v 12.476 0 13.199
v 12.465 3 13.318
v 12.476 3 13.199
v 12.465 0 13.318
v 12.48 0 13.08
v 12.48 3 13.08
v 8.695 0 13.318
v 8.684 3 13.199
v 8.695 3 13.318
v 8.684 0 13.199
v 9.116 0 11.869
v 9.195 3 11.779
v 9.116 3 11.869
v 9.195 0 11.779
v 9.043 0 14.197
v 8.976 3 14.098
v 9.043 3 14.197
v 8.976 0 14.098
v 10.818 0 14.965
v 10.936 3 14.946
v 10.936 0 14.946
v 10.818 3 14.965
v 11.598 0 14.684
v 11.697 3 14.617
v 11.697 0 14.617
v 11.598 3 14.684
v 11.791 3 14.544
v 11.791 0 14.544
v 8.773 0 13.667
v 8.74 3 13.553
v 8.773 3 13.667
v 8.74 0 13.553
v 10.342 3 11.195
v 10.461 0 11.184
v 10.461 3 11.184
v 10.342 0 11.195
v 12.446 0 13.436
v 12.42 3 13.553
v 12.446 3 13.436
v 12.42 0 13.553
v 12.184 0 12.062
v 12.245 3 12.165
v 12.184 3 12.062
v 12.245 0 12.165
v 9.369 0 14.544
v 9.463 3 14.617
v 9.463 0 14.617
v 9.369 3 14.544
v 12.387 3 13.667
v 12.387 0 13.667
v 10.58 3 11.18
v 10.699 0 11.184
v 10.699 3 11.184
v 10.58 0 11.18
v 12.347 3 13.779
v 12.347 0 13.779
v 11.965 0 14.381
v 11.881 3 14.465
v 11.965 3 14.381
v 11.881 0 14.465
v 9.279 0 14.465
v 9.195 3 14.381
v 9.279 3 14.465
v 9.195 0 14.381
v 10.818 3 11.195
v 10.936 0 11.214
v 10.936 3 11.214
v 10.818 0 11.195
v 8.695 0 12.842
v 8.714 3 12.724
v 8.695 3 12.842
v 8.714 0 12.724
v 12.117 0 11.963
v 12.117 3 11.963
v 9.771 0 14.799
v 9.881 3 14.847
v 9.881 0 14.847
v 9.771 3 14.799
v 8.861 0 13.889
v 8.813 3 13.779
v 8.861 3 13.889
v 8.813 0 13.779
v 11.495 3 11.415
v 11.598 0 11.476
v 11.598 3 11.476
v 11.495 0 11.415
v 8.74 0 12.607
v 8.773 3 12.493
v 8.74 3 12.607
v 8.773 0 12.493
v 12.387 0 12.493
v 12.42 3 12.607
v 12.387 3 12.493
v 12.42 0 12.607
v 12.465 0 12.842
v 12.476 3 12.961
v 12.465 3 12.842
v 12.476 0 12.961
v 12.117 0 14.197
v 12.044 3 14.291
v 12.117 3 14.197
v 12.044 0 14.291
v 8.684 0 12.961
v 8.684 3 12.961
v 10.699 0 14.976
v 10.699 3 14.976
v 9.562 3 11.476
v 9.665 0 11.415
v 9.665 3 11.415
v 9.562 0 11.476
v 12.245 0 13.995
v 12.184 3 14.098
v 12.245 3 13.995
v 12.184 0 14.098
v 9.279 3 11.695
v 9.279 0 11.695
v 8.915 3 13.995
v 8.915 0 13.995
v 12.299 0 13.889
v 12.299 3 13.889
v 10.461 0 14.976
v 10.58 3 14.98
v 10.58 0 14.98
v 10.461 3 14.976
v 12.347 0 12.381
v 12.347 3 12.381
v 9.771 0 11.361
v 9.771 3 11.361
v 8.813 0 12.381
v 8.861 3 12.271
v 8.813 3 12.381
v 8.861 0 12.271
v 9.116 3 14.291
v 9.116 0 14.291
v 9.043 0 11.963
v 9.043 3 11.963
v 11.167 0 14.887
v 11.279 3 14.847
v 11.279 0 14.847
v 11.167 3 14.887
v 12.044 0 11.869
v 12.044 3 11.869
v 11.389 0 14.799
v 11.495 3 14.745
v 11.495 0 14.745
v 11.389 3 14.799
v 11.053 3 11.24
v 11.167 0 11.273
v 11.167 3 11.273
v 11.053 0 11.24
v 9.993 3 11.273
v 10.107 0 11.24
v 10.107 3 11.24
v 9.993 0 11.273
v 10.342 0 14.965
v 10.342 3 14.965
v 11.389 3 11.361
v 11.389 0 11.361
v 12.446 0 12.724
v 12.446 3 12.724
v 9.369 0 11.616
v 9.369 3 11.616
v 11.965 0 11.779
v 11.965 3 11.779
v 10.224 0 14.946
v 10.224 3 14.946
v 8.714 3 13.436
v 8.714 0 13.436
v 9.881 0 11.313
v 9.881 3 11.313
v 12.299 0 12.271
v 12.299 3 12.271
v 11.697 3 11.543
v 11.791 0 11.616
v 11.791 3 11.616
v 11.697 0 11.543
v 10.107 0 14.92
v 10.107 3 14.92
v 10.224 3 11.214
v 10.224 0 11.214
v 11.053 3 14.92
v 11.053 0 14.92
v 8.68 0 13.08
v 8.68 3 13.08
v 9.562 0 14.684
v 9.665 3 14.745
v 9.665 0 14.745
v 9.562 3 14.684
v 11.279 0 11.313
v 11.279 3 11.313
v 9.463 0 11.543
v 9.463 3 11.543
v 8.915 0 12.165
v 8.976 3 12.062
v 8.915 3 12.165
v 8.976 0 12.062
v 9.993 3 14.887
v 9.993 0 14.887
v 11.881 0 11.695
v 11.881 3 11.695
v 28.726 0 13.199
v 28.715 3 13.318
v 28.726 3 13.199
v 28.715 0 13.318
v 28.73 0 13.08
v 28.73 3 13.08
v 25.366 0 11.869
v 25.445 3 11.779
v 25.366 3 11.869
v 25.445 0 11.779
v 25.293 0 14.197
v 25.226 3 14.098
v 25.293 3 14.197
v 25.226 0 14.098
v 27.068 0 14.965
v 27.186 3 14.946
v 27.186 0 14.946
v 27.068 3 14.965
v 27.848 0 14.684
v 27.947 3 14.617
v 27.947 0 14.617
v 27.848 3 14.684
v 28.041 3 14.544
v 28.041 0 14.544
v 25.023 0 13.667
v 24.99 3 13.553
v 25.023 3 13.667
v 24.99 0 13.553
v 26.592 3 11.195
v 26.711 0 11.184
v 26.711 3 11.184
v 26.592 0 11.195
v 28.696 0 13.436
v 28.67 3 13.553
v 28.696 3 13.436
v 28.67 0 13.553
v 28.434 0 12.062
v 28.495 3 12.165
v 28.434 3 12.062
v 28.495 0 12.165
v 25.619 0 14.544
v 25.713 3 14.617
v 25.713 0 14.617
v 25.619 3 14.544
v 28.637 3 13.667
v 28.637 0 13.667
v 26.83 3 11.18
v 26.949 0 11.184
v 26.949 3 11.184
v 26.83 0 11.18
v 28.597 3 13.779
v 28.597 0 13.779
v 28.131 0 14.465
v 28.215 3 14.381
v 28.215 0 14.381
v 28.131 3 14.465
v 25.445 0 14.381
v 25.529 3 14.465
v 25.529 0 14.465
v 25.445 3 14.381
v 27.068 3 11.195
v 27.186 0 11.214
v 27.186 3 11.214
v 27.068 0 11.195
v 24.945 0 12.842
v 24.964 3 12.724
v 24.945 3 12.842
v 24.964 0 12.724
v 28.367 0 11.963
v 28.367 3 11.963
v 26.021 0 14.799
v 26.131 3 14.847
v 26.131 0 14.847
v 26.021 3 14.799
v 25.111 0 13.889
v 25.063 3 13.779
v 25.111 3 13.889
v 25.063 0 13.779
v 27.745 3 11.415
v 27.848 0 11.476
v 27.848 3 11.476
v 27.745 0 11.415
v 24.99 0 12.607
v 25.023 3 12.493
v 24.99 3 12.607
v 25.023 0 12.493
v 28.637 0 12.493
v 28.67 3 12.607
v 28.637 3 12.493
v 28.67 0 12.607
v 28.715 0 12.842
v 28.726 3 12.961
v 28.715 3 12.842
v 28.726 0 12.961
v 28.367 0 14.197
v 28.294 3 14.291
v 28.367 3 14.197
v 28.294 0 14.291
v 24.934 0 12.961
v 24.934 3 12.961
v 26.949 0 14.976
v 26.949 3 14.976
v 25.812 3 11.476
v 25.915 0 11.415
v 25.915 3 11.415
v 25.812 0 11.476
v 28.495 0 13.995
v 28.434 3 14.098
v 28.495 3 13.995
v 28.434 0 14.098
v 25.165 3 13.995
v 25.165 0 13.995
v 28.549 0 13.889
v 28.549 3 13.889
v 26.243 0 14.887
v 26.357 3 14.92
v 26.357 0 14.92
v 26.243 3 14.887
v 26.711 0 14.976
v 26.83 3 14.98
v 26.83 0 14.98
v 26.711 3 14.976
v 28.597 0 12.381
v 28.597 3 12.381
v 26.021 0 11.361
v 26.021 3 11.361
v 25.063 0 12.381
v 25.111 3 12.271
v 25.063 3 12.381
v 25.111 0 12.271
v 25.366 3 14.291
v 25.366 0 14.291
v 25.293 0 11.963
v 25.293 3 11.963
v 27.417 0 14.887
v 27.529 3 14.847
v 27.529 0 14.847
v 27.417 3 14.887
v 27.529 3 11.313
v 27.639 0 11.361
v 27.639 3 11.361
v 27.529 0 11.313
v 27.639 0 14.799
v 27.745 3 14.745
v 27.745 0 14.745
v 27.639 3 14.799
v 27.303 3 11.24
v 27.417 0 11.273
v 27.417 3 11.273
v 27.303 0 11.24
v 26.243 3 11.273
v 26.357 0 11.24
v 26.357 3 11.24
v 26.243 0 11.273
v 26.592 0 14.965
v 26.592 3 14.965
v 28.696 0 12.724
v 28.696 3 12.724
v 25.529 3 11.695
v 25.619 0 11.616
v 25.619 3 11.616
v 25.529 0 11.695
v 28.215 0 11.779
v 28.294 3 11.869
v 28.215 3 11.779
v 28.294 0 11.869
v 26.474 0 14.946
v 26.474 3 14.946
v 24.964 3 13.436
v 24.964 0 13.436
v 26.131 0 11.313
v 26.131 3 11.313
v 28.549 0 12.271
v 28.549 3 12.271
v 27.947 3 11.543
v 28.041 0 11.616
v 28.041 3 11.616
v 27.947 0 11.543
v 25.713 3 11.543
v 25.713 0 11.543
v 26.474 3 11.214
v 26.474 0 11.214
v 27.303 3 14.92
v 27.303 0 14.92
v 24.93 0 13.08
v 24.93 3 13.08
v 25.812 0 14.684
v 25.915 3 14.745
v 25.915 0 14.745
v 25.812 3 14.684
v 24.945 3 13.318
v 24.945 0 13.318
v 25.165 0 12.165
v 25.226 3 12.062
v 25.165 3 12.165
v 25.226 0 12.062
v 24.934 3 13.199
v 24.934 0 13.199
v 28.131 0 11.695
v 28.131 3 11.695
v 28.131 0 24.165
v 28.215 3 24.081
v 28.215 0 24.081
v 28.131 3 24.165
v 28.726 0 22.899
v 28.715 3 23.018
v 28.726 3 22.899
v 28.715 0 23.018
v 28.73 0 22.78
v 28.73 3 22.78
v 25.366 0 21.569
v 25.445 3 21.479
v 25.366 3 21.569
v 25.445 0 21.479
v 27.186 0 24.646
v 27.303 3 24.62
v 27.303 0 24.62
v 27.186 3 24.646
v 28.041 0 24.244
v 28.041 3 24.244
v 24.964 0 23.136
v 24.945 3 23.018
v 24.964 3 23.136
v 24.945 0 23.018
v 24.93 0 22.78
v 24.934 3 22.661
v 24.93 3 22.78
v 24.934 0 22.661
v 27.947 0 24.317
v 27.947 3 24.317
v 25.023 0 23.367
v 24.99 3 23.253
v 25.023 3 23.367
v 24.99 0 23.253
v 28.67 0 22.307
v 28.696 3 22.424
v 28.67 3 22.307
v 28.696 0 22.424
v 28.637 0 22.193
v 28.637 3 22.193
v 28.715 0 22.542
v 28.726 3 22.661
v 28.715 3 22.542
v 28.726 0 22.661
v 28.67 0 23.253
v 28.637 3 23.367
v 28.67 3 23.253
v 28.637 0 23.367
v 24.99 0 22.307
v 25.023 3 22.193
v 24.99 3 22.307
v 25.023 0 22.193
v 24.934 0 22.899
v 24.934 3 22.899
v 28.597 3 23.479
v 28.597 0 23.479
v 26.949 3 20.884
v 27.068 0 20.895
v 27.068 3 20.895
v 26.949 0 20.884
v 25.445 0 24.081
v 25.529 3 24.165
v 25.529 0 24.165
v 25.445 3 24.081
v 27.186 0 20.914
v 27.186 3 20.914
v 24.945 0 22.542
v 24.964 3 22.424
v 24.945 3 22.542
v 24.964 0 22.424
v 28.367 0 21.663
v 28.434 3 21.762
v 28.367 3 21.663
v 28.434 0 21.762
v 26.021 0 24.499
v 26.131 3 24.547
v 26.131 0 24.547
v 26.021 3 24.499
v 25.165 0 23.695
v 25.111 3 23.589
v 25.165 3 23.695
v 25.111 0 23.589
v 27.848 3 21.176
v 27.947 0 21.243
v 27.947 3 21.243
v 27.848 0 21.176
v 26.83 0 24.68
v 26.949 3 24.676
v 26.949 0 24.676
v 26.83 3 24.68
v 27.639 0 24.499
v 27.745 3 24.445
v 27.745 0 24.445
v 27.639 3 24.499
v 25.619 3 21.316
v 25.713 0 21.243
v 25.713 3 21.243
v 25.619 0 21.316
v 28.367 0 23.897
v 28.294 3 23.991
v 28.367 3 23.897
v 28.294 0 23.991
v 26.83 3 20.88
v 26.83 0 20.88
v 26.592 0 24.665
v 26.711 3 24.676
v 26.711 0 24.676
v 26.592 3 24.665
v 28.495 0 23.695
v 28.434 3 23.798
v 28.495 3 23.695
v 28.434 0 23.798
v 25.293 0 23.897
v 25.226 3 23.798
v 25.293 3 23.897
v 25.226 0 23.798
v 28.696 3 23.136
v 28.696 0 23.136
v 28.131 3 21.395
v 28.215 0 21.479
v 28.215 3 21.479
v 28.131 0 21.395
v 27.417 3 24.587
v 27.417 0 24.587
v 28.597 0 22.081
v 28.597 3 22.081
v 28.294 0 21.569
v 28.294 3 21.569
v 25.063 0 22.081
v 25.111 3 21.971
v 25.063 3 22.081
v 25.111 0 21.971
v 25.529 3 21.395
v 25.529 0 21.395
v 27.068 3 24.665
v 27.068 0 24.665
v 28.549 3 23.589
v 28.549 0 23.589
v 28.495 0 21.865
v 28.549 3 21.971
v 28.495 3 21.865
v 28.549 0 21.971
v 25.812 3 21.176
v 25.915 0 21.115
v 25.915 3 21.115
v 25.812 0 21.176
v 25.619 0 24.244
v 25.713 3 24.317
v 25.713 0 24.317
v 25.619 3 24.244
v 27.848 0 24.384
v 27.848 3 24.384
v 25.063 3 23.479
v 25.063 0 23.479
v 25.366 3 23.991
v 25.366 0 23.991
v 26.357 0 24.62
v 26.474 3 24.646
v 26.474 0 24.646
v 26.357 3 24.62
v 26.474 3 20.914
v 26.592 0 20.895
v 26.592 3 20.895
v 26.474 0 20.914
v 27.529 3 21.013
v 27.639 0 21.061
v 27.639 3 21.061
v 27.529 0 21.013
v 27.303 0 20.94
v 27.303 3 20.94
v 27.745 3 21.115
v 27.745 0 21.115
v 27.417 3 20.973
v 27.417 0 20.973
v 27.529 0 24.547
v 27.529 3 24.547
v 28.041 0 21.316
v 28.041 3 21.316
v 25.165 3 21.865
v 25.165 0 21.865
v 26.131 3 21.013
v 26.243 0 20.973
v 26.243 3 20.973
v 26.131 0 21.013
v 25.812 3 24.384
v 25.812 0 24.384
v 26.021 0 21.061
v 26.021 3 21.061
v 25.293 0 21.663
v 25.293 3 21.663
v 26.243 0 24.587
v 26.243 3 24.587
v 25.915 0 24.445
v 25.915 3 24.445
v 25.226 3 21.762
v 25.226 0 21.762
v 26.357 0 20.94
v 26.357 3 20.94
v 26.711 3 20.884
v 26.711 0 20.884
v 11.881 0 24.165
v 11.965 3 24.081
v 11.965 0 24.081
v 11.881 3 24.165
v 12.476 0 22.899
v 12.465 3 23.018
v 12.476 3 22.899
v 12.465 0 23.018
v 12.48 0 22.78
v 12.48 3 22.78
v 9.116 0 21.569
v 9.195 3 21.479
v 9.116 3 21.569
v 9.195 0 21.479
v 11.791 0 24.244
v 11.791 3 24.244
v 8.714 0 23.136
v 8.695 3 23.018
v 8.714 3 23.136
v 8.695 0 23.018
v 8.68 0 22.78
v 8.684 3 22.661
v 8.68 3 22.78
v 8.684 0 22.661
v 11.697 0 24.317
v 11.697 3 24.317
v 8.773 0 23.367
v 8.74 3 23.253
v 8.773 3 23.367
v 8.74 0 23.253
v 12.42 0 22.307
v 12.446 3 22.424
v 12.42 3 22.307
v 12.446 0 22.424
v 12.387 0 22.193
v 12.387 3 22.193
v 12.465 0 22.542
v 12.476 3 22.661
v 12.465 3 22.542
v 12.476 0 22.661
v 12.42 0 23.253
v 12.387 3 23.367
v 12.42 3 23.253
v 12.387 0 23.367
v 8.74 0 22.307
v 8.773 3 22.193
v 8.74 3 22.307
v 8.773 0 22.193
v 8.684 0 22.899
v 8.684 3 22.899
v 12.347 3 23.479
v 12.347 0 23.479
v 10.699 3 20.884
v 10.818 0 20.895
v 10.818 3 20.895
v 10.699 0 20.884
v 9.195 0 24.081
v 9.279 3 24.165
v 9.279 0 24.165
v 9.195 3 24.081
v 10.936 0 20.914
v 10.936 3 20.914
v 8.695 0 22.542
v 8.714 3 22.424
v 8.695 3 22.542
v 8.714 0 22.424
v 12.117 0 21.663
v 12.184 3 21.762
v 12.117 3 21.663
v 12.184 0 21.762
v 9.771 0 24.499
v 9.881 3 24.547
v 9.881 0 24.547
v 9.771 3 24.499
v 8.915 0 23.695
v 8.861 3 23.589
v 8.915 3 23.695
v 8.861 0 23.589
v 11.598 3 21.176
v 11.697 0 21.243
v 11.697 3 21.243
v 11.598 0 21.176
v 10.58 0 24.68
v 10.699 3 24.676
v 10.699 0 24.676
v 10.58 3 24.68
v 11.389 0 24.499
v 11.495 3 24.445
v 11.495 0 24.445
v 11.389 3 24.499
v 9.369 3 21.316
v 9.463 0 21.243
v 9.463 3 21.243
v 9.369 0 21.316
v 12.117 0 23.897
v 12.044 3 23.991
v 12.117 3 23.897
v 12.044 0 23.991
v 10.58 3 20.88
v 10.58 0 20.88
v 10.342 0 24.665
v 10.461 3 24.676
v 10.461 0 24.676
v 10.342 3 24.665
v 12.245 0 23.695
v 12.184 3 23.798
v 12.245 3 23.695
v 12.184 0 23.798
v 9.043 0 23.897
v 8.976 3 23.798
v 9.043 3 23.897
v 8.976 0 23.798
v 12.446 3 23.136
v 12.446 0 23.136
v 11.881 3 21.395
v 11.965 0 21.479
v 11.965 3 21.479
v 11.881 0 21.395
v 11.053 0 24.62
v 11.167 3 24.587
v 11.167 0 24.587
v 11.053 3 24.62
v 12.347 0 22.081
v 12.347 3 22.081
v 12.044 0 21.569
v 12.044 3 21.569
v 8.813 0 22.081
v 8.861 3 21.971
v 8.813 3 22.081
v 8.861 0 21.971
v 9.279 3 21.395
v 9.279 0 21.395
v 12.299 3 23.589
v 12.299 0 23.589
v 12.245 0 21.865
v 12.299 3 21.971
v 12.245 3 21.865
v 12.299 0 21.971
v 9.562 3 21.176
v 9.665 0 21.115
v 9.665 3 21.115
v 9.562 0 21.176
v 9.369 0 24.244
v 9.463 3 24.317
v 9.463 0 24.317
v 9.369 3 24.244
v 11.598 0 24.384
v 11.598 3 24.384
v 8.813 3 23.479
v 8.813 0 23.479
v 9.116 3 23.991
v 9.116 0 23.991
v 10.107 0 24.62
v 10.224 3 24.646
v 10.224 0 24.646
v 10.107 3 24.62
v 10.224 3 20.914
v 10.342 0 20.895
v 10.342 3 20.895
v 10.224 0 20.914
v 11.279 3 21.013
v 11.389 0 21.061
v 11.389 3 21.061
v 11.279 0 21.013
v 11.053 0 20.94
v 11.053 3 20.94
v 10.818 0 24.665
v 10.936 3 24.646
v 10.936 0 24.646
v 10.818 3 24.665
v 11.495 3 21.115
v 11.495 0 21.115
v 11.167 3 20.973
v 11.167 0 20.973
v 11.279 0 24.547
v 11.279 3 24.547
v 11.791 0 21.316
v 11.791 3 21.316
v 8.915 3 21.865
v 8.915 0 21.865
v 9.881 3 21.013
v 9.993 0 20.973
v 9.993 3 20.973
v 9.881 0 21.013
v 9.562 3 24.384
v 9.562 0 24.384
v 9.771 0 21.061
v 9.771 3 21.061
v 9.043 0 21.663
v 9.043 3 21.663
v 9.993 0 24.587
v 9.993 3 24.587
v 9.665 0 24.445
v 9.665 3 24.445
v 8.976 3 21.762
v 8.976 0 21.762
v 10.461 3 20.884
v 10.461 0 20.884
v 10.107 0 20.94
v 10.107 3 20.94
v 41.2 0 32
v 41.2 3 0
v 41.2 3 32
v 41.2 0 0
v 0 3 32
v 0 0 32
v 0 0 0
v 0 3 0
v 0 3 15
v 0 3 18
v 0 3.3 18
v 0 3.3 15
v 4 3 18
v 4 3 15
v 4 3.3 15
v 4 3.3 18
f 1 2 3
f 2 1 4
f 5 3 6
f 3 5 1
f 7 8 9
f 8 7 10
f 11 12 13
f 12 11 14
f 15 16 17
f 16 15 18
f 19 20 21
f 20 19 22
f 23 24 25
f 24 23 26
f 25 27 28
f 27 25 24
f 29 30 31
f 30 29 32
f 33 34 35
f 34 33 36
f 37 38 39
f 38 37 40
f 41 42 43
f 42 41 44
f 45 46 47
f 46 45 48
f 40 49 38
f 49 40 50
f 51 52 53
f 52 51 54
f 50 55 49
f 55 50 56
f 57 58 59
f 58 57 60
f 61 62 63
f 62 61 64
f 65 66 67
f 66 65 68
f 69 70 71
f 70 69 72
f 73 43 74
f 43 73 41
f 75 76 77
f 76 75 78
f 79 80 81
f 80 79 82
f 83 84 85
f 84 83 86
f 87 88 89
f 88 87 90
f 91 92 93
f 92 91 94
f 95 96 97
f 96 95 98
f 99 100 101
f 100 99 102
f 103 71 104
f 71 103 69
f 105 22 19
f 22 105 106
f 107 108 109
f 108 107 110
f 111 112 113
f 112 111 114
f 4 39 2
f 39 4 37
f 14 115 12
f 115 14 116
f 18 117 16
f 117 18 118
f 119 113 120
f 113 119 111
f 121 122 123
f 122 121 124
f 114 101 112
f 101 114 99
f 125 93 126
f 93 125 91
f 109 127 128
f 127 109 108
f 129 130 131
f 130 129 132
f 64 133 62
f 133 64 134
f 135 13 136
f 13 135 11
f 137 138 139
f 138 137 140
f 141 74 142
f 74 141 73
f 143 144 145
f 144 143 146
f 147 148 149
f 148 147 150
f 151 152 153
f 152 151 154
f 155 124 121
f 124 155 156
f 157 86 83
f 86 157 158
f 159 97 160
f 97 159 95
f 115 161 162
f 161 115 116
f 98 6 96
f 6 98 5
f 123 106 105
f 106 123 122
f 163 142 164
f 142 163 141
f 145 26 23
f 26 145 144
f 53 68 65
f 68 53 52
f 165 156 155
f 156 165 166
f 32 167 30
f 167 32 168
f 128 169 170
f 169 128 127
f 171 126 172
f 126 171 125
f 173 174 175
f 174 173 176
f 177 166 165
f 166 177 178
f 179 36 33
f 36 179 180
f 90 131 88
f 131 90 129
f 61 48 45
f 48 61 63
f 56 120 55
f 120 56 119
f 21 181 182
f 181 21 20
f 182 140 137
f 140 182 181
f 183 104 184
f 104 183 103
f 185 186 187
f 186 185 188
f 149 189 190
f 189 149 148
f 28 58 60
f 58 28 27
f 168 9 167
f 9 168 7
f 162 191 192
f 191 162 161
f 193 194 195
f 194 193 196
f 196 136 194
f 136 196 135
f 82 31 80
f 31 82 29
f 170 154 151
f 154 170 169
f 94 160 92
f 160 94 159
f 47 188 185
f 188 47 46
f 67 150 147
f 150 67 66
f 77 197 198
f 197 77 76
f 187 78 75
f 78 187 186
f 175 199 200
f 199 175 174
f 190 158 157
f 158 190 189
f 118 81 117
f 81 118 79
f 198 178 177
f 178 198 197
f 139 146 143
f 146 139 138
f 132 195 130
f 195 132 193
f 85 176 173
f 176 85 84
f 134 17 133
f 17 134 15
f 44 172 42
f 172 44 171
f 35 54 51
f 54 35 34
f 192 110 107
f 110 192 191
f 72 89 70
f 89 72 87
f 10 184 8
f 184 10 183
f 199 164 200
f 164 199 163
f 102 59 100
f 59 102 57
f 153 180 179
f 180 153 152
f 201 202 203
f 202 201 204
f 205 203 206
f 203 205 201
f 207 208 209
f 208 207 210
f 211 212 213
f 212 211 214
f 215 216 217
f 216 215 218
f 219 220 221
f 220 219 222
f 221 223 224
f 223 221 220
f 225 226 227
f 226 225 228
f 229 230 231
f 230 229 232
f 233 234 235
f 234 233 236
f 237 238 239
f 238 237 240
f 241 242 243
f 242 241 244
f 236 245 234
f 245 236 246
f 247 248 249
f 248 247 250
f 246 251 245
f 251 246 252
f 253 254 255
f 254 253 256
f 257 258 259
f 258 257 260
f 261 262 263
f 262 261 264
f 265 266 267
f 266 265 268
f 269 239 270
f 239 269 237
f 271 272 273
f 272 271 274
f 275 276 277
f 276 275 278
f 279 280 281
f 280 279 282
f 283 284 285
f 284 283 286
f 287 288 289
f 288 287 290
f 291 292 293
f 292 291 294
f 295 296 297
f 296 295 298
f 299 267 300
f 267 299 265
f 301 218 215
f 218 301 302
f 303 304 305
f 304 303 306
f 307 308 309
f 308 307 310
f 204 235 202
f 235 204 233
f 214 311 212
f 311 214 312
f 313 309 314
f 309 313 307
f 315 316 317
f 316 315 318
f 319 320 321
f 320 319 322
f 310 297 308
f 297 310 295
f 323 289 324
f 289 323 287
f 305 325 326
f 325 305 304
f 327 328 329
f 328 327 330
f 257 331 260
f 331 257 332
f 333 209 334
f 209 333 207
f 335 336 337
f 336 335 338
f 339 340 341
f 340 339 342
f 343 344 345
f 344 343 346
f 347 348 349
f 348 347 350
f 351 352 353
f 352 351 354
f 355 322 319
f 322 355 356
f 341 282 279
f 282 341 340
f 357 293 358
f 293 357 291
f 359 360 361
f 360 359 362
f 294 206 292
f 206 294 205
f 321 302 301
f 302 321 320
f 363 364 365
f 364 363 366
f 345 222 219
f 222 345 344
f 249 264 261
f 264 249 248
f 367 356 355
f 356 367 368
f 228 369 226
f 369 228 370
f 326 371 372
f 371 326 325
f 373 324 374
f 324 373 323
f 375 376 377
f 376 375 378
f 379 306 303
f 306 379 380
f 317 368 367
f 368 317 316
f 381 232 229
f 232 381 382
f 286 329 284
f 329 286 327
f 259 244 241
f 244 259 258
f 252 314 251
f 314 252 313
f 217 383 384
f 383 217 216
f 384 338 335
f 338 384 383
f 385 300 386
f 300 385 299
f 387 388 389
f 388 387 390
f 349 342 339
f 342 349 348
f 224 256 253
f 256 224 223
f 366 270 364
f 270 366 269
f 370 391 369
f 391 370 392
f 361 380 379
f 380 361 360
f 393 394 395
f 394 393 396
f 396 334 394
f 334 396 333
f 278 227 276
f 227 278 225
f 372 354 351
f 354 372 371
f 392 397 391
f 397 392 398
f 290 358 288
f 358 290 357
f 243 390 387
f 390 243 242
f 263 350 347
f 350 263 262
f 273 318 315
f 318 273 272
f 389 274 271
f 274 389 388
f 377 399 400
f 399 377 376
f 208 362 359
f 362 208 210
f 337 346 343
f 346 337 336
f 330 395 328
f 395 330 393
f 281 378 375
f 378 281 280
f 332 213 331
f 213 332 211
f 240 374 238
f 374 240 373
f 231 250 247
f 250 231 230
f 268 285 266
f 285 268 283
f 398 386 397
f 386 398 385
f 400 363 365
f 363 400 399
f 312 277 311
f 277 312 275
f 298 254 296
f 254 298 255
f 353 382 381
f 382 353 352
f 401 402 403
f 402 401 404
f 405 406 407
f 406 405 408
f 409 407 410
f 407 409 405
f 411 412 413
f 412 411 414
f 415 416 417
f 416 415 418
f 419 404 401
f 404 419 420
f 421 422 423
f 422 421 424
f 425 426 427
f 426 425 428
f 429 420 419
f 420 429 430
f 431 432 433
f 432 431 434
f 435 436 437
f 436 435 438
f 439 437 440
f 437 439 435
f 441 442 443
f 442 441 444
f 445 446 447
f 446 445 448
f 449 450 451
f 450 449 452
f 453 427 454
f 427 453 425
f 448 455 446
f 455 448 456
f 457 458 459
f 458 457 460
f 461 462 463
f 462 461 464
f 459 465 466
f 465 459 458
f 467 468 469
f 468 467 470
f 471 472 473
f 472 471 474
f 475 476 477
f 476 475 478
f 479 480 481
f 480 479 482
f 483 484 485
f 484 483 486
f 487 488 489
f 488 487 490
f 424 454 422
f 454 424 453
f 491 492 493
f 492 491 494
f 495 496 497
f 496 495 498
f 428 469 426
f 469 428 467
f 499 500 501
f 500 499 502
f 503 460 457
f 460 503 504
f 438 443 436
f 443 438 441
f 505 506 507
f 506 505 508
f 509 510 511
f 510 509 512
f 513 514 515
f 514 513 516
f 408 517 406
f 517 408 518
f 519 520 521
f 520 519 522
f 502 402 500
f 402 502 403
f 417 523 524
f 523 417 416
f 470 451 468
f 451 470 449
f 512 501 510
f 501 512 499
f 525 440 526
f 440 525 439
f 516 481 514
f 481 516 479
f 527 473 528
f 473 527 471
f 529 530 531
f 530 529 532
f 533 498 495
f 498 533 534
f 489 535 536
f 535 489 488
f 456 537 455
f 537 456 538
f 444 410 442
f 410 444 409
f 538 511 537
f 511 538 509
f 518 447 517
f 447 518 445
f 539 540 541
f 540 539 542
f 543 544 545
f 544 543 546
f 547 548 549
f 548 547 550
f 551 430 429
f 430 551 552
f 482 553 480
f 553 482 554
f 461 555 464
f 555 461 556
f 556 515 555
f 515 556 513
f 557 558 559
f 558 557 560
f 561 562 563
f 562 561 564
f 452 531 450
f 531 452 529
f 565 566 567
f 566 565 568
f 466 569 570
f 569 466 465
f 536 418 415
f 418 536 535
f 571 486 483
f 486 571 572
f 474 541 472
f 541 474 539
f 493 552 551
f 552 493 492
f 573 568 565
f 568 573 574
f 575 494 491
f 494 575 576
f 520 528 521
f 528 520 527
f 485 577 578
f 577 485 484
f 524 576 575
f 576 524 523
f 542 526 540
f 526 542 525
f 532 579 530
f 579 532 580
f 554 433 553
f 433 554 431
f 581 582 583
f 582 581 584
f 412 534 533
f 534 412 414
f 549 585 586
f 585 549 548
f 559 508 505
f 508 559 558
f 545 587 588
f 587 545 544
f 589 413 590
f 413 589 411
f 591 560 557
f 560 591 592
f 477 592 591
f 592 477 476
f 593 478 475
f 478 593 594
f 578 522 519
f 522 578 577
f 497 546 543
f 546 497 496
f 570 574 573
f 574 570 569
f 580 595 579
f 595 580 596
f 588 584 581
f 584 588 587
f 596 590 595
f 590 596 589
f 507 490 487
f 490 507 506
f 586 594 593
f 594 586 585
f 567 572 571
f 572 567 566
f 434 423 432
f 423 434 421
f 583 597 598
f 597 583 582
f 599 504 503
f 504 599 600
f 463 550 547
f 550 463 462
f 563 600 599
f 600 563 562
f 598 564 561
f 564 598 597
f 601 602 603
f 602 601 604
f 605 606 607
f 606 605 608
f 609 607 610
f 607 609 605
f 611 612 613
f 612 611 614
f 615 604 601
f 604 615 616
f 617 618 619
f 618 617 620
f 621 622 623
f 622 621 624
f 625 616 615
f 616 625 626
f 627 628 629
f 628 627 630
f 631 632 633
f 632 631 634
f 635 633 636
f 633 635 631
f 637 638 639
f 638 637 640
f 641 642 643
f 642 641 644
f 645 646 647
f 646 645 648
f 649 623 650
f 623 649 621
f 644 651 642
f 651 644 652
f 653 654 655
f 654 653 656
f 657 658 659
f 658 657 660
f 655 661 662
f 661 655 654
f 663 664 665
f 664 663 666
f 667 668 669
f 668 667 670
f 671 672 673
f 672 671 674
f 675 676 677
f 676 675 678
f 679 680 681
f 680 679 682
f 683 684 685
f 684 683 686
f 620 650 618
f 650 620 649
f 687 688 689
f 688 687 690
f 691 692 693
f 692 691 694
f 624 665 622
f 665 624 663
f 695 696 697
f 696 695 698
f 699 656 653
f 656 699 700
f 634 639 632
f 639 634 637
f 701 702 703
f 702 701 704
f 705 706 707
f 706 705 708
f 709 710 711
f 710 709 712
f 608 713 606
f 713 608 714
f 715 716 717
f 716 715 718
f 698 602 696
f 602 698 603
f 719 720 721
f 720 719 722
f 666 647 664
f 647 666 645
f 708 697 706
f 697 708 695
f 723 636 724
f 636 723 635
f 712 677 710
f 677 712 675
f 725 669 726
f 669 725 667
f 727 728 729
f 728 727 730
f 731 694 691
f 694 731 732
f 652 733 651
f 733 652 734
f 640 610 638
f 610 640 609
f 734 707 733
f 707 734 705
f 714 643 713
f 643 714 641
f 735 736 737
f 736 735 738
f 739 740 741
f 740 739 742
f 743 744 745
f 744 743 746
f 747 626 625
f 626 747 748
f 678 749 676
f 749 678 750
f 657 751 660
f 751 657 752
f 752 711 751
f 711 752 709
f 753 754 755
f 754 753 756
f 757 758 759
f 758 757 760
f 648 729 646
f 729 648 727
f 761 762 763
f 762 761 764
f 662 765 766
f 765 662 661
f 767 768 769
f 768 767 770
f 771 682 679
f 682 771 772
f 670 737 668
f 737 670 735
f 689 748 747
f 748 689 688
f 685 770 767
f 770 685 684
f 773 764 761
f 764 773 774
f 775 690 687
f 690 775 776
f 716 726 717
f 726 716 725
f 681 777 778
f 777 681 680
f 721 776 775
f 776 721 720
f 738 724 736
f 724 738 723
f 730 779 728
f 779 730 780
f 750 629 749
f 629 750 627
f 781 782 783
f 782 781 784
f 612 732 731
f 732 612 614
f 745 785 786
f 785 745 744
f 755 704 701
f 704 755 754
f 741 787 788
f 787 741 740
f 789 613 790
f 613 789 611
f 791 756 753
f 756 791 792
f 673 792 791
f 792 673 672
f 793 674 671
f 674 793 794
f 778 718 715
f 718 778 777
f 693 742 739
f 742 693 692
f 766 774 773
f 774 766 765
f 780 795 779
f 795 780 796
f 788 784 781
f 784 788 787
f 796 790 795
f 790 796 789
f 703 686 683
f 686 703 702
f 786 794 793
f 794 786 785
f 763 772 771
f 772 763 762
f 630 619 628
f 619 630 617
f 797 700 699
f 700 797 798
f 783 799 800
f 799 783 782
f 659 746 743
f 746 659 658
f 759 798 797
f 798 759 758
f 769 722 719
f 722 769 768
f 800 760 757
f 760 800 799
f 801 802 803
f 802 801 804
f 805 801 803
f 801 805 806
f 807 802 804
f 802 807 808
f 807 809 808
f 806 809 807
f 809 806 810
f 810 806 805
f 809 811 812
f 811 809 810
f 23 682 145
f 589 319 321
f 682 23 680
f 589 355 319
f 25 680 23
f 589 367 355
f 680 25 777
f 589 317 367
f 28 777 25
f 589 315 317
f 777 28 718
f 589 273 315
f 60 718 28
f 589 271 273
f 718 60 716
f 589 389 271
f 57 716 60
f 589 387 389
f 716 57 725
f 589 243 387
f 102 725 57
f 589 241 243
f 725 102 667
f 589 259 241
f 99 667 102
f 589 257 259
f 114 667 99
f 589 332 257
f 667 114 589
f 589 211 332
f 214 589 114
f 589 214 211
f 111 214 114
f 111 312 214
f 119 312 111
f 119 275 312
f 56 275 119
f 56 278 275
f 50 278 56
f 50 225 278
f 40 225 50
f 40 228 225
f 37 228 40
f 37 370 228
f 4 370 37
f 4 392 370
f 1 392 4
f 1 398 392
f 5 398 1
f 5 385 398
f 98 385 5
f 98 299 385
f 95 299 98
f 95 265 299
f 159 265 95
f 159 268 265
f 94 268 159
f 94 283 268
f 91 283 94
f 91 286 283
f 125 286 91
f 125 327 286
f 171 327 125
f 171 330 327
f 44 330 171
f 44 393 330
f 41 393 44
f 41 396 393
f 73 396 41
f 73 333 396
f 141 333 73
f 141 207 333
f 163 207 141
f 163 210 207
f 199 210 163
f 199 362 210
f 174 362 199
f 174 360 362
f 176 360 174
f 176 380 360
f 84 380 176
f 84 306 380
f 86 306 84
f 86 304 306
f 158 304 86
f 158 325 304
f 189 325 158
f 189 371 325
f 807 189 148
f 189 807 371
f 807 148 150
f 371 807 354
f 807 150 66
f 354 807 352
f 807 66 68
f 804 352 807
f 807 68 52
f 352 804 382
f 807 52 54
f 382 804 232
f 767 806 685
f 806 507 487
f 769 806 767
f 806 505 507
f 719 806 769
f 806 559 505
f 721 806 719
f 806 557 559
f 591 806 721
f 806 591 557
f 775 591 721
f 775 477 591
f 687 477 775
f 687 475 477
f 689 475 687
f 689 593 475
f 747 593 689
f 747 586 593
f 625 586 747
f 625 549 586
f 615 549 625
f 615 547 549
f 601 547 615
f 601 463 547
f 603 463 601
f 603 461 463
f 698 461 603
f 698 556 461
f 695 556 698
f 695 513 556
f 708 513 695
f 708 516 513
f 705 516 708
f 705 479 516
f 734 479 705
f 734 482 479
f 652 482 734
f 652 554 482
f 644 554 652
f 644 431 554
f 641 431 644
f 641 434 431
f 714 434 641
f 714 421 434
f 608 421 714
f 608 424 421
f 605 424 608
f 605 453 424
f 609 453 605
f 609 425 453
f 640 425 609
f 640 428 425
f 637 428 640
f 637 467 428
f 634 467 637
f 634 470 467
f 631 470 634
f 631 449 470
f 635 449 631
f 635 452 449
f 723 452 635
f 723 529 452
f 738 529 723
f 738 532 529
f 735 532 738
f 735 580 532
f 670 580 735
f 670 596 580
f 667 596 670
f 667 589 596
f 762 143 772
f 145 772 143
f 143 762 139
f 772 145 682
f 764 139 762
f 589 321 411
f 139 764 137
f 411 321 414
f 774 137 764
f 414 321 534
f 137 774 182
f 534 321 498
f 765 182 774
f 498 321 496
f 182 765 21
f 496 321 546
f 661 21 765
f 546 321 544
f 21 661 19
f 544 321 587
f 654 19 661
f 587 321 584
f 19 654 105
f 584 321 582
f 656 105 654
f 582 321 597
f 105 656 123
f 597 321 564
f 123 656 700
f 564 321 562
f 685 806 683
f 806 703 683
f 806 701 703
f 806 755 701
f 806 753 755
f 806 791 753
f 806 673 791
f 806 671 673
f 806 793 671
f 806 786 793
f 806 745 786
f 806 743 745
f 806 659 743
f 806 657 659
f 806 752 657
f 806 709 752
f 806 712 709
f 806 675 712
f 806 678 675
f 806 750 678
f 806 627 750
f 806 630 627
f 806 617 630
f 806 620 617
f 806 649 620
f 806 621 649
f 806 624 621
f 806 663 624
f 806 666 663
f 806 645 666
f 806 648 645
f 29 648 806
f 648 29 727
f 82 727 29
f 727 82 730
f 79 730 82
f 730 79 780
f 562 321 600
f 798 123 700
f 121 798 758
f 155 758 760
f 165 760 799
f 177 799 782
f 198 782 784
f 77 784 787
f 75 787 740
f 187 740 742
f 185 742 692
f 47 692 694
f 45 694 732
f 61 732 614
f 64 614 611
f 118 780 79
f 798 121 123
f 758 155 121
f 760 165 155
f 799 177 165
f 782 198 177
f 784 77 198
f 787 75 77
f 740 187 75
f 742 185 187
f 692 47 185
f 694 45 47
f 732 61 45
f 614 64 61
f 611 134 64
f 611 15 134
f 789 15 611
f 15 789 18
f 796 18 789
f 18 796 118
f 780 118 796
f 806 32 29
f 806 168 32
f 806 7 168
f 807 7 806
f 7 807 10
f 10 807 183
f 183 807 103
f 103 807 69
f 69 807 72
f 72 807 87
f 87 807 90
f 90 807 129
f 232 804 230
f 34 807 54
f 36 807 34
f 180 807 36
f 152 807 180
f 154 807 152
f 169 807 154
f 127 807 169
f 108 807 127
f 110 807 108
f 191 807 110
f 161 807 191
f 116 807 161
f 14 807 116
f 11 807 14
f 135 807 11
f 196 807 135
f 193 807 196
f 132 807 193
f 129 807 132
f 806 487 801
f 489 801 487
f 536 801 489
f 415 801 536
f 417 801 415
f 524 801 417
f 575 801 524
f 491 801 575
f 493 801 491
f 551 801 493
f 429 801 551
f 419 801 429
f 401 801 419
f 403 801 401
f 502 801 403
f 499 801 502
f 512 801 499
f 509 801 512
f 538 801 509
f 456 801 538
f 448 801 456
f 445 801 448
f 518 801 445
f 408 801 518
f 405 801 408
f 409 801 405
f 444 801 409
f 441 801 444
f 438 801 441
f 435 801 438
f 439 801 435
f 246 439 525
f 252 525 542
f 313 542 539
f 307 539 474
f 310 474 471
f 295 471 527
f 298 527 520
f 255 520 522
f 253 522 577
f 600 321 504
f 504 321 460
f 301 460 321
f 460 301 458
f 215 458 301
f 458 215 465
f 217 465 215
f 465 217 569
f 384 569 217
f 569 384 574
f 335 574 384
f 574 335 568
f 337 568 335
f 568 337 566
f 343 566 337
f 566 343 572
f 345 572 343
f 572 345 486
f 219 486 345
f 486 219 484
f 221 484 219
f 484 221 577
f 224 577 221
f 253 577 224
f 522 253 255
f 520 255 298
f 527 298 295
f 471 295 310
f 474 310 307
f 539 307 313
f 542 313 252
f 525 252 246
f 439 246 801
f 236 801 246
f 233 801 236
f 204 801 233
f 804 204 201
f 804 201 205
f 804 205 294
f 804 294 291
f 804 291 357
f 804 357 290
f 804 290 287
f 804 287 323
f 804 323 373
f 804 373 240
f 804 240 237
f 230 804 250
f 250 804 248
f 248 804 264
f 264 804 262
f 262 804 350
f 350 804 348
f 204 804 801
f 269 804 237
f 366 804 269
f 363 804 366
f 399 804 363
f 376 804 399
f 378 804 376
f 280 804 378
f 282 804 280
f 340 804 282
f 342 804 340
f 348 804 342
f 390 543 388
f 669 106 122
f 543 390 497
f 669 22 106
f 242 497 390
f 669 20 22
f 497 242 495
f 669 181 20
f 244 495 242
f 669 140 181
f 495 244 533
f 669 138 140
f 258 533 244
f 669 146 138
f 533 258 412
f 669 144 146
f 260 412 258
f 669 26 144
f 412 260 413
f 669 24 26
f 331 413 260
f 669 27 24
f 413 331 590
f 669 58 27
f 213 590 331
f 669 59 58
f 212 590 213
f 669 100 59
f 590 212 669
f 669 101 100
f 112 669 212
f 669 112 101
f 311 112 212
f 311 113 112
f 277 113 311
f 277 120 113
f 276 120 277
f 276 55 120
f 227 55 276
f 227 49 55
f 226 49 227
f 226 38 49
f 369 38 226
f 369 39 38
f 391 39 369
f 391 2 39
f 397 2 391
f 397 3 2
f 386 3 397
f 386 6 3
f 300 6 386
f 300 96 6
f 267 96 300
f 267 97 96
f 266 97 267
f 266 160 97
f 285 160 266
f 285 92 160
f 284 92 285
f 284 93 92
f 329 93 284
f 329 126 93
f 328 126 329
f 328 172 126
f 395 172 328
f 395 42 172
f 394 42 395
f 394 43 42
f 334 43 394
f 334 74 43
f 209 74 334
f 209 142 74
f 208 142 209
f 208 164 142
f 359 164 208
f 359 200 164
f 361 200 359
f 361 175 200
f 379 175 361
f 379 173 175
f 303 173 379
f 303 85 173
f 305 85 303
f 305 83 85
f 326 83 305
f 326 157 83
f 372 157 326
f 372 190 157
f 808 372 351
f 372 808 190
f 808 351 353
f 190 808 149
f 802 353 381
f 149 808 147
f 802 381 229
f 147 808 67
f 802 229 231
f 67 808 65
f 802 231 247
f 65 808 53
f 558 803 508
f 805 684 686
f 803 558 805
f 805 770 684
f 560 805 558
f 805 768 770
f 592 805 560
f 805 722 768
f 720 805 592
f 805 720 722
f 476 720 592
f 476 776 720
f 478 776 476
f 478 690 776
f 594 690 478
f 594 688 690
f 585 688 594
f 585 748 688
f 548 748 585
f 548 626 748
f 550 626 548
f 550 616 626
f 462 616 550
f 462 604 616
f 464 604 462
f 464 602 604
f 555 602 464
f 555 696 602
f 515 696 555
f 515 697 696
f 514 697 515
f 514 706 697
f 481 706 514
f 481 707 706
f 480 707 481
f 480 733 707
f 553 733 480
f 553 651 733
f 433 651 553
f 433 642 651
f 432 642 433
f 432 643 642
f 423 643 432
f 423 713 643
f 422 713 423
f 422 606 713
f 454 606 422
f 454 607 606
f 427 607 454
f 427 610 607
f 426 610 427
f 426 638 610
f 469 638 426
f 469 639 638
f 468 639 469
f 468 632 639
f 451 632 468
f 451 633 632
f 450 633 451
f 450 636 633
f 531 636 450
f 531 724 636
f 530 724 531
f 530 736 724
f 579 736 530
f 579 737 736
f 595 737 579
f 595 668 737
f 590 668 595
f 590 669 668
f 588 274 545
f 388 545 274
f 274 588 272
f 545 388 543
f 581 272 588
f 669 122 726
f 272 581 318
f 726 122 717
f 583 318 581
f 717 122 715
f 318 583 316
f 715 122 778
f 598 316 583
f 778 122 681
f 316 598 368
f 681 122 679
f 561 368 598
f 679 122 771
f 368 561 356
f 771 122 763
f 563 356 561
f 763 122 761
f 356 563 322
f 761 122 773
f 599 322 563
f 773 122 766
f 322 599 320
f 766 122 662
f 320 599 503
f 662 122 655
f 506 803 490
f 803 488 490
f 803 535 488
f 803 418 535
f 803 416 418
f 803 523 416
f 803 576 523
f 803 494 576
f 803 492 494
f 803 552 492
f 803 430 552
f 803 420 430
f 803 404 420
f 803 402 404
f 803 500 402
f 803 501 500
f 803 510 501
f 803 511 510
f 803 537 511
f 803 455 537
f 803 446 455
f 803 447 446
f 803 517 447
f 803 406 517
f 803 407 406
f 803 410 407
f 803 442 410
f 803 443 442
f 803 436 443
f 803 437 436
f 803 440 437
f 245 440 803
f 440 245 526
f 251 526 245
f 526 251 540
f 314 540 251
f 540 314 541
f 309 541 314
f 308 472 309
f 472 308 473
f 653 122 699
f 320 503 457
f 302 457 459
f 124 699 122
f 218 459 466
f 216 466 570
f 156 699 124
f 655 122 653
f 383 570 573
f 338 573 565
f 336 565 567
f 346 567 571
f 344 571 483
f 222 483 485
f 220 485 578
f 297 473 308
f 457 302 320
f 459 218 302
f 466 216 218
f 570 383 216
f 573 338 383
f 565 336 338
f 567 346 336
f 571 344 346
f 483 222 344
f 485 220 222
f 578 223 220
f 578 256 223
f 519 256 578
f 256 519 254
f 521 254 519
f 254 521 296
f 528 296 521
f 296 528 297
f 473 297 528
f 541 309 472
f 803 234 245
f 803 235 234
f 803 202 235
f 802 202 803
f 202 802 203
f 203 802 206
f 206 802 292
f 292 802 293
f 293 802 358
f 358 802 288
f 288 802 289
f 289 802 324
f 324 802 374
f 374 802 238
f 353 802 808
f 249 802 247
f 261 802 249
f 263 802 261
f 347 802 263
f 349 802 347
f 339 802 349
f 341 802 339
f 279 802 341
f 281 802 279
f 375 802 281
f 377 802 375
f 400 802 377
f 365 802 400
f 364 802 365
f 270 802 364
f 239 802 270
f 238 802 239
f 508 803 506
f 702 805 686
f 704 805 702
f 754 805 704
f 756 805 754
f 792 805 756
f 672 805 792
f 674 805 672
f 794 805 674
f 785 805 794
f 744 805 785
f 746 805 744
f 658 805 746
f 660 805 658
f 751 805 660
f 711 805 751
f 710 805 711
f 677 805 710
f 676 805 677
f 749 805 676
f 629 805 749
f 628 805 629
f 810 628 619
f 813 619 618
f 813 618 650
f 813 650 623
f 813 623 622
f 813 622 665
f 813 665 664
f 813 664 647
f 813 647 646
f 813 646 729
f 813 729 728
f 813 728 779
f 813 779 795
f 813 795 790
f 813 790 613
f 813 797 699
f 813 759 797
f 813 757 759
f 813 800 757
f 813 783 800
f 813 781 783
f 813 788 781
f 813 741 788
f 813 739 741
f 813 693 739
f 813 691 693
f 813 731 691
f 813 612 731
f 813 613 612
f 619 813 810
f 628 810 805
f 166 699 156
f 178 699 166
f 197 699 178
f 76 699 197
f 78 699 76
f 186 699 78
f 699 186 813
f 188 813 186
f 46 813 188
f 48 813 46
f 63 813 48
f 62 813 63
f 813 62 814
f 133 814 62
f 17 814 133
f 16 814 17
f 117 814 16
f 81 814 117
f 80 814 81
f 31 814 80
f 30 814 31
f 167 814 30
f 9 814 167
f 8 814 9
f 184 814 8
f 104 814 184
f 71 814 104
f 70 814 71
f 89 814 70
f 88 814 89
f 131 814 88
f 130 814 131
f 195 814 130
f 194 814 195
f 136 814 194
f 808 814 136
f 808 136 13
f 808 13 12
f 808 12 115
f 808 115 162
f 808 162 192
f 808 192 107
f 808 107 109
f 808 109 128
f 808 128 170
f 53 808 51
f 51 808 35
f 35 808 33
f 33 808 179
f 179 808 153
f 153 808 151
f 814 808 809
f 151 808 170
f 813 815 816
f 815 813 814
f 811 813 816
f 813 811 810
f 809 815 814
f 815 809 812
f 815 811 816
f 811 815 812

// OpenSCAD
$fn = 100;
hole_diameter = 3.8;
height = 41.2;
width = 32;
vert_hole_space = 28.34;
horiz_hole_space = 15.7;
wall_thickness = 3;

draft = 1;

difference() {
  color("lightblue") cube([height, height, width]);
  
  if (draft) {
    color("lightblue") translate([-0.1,wall_thickness,-1]) cube([height+2, height+2, width+2]);
  } else {
    color("lightblue") translate([wall_thickness,wall_thickness,-1]) cube([height+2, height+2, width+2]);
  }

  four_holes();
  two_holes();
}

if (draft) {
  translate([0, 0, 15]) cube([4,3.3,3]);
}

module four_holes() {
  // Top right            [up/dn, left/rt, ..]
  rotate([90,0,0]) translate([10.58,8.08 + 5,-1 * (wall_thickness + 1)]) cylinder(h = wall_thickness+2, d = hole_diameter);
  // bottom right
  rotate([90,0,0]) translate([7.58 + 19.25,8.08 + 5,-1 * (wall_thickness + 1)]) cylinder(h = wall_thickness+2, d = hole_diameter);
  // bottom left
  rotate([90,0,0]) translate([7.58 + 19.25,7.58 + 15.2,-1 * (wall_thickness + 1)]) cylinder(h = wall_thickness+2, d = hole_diameter);
  // top left
  rotate([90,0,0]) translate([10.58,7.58 + 15.2,-1 * (wall_thickness + 1)]) cylinder(h = wall_thickness+2, d = hole_diameter);
}

module two_holes() {
  rotate([90,0,90]) translate([18,width/2,-1 * (1 )]) cylinder(h = wall_thickness+2, d = hole_diameter);
  rotate([90,0,90]) translate([32,width/2,-1 * (1 )]) cylinder(h = wall_thickness+2, d = hole_diameter);
}

/*
  // Holes
  rotate([90,0,0]) translate([7.58,7.58,-1 * (wall_thickness + 1)]) cylinder(h = wall_thickness+2, d = hole_diameter);
  rotate([90,0,0]) translate([7.58 + 28.34,7.58,-1 * (wall_thickness + 1)]) cylinder(h = wall_thickness+2, d = hole_diameter);
  rotate([90,0,0]) translate([7.58 + 28.34,7.58 + 15.7,-1 * (wall_thickness + 1)]) cylinder(h = wall_thickness+2, d = hole_diameter);
  rotate([90,0,0]) translate([7.58,7.58 + 15.7,-1 * (wall_thickness + 1)]) cylinder(h = wall_thickness+2, d = hole_diameter);
*/
